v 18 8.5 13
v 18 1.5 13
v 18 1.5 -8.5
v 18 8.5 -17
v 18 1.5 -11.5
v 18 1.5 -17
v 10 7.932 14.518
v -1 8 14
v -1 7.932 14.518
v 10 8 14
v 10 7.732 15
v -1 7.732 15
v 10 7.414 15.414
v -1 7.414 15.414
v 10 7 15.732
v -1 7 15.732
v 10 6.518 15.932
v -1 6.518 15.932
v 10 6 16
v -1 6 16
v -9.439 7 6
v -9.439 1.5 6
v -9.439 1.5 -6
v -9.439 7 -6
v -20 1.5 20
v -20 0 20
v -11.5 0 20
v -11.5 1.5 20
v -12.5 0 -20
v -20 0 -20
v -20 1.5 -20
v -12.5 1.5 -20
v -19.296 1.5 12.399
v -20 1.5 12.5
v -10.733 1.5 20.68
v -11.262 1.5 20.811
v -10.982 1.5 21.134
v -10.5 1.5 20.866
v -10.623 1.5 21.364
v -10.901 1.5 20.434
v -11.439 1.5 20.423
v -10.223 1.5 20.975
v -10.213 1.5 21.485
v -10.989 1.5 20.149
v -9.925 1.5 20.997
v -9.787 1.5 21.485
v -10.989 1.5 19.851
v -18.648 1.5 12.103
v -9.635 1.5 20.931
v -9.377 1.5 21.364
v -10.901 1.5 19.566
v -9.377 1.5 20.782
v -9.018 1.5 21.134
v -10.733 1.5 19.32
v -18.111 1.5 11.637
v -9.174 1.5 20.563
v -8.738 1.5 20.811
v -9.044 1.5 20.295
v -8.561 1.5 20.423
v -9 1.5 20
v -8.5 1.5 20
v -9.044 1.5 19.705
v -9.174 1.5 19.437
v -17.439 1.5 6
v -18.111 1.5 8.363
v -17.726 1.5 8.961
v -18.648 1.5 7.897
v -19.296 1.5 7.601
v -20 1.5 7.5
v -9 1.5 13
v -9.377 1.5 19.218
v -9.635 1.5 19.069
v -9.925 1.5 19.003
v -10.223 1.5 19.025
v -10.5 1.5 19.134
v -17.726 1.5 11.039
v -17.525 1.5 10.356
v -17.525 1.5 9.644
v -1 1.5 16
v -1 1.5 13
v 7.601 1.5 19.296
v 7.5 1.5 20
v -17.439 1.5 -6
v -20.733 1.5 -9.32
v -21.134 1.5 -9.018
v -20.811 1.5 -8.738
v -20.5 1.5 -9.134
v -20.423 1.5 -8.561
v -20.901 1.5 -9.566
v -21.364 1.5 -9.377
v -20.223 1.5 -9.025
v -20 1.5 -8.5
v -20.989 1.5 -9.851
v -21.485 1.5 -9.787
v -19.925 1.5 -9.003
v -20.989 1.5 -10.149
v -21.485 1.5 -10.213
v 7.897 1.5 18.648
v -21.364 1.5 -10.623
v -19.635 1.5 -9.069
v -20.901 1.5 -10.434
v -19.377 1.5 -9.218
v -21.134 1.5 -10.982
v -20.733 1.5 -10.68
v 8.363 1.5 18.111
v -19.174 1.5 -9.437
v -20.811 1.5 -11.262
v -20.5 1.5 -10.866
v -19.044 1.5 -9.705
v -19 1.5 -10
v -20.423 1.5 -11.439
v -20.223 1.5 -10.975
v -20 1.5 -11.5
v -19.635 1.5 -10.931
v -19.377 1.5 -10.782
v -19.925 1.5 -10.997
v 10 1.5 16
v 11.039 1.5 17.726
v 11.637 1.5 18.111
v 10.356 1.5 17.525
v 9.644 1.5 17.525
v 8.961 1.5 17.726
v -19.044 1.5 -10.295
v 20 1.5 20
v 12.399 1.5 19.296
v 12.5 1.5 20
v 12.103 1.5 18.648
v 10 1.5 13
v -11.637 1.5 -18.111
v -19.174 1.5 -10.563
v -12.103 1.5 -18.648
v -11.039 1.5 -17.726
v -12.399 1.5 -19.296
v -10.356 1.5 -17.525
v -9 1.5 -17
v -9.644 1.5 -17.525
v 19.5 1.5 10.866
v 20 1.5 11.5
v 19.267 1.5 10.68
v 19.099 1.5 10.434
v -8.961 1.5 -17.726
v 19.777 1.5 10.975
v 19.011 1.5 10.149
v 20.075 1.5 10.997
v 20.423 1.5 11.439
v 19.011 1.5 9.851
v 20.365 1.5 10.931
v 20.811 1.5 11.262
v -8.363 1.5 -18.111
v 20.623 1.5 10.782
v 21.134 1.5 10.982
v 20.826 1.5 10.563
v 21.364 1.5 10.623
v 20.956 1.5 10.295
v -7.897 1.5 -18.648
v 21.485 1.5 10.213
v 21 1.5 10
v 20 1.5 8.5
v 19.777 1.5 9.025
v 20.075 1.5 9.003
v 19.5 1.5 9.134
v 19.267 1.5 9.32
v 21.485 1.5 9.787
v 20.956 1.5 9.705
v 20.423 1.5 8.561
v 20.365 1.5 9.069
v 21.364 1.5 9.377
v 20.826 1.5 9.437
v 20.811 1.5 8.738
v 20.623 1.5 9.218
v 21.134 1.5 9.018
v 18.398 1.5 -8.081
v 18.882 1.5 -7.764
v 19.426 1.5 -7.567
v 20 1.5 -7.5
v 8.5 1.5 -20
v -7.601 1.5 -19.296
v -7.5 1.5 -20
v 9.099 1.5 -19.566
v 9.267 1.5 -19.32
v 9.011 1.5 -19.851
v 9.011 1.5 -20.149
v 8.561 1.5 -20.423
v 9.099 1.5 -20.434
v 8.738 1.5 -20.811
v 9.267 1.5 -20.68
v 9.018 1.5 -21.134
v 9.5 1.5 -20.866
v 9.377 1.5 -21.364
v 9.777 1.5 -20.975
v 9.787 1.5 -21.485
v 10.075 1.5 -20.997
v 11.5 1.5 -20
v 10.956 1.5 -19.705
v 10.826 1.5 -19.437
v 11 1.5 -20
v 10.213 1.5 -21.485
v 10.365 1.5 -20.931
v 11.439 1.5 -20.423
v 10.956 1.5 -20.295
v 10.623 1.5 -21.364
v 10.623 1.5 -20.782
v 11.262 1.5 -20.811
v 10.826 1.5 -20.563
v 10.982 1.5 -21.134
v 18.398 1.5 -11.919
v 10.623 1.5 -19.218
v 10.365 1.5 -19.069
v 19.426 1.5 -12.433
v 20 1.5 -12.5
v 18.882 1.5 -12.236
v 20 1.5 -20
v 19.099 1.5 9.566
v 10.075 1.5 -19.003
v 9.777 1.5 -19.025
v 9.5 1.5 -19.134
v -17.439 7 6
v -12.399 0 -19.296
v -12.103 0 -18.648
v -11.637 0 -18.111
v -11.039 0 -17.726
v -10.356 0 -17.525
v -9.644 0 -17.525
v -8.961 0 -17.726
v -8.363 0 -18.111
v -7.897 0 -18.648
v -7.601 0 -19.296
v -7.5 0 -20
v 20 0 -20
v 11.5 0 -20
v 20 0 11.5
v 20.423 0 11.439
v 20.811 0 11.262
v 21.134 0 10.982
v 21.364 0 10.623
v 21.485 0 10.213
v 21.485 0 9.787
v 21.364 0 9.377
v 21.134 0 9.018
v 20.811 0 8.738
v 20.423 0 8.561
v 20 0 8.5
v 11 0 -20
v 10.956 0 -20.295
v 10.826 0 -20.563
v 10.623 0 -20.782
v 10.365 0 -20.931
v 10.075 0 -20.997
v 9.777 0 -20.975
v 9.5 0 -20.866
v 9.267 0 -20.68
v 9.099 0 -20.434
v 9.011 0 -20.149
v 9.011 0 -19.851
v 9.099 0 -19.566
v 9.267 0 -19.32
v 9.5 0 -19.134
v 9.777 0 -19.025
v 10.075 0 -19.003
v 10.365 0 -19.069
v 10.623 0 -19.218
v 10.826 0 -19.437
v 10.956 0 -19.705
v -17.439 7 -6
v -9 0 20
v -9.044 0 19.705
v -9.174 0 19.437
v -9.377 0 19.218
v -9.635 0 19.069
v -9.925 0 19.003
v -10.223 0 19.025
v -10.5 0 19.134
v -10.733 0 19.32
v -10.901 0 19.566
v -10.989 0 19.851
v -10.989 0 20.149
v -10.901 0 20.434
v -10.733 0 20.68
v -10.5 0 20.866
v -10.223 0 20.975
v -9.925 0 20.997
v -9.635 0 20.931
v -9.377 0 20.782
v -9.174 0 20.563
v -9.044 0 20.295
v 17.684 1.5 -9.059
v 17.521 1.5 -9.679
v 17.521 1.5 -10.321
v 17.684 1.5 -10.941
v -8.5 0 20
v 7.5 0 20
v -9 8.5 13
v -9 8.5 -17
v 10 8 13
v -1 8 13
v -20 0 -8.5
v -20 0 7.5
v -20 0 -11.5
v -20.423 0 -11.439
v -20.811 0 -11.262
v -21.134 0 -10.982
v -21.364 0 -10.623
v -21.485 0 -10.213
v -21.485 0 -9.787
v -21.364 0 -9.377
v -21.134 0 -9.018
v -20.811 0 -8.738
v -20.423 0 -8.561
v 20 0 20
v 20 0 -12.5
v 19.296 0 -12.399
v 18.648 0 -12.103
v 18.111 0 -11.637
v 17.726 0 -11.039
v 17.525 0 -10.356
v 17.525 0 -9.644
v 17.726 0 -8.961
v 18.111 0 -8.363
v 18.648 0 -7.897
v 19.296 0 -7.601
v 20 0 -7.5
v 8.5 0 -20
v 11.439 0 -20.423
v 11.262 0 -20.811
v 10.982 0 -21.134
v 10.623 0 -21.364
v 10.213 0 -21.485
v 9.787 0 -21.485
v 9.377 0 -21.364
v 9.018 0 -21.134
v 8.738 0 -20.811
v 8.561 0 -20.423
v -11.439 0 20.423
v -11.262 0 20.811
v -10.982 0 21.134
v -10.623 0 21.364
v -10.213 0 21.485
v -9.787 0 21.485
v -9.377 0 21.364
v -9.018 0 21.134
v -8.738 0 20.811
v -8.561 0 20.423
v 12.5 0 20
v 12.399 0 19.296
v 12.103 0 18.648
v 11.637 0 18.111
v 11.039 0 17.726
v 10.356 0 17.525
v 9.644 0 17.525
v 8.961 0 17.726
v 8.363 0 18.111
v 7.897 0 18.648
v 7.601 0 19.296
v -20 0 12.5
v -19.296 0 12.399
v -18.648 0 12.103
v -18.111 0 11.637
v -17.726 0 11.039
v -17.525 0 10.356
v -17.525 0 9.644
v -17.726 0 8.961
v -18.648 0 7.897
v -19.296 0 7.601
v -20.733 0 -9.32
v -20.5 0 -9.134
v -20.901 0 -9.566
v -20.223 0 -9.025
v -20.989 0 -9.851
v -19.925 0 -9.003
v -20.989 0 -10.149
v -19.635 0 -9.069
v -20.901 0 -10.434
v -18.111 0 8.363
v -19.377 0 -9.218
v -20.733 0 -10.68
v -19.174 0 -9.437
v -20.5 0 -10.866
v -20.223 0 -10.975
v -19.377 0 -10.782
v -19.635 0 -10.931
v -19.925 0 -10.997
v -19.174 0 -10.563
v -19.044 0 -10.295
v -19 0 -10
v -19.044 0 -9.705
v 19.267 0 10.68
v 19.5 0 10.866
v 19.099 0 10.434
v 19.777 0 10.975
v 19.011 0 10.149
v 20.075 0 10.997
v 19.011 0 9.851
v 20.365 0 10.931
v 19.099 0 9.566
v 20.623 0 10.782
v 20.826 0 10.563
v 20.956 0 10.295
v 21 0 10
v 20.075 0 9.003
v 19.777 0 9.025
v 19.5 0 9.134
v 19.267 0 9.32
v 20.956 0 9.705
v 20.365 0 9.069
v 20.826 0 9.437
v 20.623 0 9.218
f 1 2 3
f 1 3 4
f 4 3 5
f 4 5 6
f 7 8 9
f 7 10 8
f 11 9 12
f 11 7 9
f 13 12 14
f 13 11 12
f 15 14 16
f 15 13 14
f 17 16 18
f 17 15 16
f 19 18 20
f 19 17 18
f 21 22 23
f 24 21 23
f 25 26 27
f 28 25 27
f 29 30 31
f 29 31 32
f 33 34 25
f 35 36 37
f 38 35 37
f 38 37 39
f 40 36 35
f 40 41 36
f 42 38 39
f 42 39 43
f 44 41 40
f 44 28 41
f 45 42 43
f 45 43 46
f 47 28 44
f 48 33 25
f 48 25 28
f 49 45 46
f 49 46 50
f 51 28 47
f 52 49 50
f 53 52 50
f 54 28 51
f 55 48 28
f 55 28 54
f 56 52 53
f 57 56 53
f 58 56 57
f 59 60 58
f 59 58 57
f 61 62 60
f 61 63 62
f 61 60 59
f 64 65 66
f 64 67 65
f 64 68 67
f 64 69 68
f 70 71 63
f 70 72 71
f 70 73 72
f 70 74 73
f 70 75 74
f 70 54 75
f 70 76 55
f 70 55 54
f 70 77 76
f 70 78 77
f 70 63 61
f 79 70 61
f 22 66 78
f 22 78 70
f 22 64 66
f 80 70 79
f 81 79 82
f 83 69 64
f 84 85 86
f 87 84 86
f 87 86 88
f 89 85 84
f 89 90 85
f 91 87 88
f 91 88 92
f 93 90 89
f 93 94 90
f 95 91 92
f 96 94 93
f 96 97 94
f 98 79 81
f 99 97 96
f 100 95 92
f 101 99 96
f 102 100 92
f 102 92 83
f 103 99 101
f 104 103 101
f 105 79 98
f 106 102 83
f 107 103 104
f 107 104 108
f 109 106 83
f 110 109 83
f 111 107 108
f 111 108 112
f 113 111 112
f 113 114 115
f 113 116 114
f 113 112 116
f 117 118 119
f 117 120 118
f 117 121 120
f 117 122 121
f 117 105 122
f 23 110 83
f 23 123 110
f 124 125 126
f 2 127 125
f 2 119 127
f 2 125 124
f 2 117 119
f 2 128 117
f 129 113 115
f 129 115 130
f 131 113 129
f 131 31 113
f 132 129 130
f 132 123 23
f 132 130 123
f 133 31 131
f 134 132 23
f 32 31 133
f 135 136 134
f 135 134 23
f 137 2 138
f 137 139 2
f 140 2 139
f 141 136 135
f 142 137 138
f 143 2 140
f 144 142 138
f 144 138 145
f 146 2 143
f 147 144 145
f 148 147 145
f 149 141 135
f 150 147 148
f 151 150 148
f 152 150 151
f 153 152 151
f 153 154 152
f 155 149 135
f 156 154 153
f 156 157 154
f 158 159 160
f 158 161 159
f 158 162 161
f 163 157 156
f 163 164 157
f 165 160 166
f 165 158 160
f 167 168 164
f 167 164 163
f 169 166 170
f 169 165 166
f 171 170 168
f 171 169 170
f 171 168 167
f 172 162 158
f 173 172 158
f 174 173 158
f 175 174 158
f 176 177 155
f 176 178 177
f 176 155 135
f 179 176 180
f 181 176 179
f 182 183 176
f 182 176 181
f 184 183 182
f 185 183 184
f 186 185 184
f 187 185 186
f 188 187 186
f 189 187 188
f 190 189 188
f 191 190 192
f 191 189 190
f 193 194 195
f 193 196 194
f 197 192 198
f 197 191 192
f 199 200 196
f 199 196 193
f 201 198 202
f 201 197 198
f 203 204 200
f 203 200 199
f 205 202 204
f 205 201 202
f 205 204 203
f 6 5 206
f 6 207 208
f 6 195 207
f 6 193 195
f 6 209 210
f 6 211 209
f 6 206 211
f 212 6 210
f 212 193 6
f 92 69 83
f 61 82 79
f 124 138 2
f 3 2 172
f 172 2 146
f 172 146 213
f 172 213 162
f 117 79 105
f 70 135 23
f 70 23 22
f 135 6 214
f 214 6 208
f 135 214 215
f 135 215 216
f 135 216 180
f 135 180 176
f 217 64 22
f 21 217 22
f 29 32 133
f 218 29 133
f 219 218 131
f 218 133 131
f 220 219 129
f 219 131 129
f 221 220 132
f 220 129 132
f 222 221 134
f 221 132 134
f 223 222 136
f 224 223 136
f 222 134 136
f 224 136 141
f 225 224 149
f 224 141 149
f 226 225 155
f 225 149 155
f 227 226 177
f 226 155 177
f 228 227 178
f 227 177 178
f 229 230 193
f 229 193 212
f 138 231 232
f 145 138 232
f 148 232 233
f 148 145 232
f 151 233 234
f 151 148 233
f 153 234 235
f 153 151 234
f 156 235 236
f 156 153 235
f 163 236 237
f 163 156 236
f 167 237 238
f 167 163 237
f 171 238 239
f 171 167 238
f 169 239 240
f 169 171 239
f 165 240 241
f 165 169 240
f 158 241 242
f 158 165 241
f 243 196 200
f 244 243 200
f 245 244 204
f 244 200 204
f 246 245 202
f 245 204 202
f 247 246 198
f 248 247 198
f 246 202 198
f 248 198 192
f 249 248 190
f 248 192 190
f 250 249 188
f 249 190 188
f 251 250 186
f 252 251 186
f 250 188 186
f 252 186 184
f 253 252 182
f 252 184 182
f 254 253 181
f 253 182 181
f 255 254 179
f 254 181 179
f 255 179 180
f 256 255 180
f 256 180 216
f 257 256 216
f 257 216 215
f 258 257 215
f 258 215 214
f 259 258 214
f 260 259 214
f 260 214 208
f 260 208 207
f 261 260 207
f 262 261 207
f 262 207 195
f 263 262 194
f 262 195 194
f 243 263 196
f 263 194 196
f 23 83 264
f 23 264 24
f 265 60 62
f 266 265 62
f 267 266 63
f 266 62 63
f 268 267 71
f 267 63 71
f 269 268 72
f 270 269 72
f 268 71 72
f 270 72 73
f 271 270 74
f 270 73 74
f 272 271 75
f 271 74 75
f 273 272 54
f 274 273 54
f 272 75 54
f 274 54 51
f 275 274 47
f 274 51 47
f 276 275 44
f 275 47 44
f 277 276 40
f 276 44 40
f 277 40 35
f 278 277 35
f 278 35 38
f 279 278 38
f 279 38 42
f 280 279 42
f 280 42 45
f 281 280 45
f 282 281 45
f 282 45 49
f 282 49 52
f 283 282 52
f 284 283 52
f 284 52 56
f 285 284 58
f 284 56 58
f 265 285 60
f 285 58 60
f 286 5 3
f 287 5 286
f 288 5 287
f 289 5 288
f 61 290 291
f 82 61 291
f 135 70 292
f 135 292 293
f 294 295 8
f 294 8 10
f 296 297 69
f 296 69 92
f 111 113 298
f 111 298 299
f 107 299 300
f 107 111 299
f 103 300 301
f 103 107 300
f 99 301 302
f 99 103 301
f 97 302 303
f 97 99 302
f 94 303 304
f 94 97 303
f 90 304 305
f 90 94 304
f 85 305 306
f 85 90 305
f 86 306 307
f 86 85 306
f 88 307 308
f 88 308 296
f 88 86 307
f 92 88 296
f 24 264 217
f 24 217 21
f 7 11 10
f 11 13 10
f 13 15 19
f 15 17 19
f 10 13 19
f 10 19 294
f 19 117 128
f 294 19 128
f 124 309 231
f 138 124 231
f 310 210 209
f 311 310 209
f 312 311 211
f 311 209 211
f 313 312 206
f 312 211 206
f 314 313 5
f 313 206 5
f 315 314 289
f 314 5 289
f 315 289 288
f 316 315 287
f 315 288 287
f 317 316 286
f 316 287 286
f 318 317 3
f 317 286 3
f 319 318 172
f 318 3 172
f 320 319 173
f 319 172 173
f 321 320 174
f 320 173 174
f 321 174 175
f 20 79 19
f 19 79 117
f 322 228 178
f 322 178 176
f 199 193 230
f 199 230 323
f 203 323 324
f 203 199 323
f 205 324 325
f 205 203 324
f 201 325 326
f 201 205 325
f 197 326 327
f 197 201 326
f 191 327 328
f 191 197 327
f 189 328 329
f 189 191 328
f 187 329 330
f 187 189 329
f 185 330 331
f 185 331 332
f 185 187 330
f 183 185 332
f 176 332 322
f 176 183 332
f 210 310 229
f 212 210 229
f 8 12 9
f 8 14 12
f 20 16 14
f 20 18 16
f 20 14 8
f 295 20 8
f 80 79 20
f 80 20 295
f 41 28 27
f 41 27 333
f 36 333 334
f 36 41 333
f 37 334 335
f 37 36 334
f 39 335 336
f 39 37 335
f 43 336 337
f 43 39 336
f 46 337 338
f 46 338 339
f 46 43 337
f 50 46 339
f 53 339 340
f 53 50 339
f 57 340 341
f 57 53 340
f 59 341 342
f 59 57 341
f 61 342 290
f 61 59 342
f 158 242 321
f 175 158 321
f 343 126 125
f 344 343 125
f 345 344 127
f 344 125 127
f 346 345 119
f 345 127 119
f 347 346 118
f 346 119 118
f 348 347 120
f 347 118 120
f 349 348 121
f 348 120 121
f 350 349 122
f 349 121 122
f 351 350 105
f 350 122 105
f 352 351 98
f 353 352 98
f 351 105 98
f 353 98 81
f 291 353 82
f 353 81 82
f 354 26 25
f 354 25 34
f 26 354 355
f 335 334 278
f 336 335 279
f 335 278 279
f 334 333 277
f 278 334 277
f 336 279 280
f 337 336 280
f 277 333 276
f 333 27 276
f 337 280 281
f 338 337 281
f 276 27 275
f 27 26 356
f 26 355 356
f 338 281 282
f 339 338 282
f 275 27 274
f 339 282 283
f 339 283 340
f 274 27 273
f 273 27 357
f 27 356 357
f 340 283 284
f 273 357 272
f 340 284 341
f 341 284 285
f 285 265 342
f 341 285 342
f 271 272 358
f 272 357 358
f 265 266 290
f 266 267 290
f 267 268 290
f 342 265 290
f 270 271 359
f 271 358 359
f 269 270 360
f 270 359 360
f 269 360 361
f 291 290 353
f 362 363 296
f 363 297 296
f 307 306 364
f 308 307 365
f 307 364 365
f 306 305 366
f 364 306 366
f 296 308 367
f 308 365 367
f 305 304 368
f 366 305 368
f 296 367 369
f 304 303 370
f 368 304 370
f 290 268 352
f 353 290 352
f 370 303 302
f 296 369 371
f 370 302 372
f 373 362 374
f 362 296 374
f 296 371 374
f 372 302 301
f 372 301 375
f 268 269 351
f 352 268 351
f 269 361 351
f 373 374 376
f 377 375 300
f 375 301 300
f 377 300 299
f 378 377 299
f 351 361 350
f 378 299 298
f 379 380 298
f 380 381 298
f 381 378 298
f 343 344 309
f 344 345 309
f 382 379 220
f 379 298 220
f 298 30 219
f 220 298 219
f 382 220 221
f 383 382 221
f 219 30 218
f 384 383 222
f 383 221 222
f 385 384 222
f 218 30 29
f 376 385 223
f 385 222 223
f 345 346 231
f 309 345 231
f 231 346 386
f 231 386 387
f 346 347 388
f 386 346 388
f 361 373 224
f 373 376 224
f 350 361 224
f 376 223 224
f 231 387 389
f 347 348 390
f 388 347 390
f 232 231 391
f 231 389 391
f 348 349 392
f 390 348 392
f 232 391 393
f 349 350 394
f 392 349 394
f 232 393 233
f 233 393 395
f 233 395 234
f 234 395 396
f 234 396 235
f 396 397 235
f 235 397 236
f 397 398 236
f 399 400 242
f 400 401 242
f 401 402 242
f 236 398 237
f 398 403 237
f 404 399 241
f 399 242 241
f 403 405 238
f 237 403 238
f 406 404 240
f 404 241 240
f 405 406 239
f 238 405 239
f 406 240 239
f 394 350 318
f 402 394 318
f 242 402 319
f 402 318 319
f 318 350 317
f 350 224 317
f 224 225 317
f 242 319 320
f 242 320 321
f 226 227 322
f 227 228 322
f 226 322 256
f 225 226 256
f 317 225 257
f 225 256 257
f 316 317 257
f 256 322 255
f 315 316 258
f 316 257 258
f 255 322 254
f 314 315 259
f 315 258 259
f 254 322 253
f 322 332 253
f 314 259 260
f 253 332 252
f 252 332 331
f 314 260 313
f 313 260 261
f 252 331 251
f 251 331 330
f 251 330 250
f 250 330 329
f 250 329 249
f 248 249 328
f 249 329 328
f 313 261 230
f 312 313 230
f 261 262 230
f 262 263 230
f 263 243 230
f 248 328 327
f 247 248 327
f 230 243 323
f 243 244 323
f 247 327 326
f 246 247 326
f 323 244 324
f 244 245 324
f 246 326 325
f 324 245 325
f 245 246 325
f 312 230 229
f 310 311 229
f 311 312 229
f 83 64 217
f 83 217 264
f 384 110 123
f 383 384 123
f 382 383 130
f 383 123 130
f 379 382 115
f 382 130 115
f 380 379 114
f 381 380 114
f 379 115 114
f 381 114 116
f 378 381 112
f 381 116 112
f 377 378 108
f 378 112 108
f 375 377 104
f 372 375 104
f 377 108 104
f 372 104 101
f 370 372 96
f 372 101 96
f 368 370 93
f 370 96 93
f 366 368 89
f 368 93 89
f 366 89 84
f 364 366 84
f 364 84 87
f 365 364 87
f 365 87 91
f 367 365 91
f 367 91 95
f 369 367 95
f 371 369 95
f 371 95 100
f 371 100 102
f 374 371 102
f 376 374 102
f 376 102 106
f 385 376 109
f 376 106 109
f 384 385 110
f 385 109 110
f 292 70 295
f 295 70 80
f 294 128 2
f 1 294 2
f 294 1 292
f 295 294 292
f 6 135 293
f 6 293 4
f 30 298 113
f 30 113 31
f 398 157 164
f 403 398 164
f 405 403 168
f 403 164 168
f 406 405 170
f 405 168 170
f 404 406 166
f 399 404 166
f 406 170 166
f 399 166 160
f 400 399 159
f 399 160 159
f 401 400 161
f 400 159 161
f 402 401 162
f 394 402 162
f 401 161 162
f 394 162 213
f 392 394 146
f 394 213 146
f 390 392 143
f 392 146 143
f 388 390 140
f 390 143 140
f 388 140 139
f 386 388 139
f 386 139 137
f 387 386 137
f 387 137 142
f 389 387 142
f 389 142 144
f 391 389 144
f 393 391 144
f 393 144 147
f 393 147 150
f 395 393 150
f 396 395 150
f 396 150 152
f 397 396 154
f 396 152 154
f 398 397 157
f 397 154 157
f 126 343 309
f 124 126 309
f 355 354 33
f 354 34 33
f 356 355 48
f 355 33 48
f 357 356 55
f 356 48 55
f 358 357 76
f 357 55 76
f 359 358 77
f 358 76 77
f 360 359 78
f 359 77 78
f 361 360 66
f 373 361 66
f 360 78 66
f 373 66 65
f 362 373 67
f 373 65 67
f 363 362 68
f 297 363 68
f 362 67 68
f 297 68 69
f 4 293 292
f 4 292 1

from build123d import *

# Parameters (mm, degrees)
SKETCH1_W           = 40
SKETCH1_H           = 40
BOSS_EXTRUDE1_DEPTH = 1.5
SKETCH2_R           = 1.5
BOSS_EXTRUDE2_DEPTH = 1.5
SKETCH3_R           = 1
SKETCH3_R_2         = 2.5
CUT_EXTRUDE1_DEPTH  = 1.5
SKETCH4_W           = 8
SKETCH4_H           = 12
BOSS_EXTRUDE3_DEPTH = 5.5
SKETCH5_W           = 27
SKETCH5_H           = 30
BOSS_EXTRUDE4_DEPTH = 7
SKETCH6_W           = 11
SKETCH6_H           = 3
BOSS_EXTRUDE5_DEPTH = 6.5
FILLET1_R           = 2


with BuildPart() as part:
    # Sketch1 → Boss-Extrude1 (new body)
    with BuildSketch(Plane(origin=(0, 0, 0), x_dir=(1, 0, 0), z_dir=(0, 1, 0))):
        Rectangle(SKETCH1_W, SKETCH1_H)
    extrude(amount=BOSS_EXTRUDE1_DEPTH)

    # Sketch2 → Boss-Extrude2 (add)
    with BuildSketch(Plane(origin=(0, 1.5, 0), x_dir=(1, 0, 0), z_dir=(0, 1, 0))):
        with Locations((-20, 10)):
            Circle(SKETCH2_R)
        with Locations((10, 20)):
            Circle(SKETCH2_R)
        with Locations((20, -10)):
            Circle(SKETCH2_R)
        with Locations((-10, -20)):
            Circle(SKETCH2_R)
    extrude(amount=-BOSS_EXTRUDE2_DEPTH)

    # Sketch3 → Cut-Extrude1 (cut)
    with BuildSketch(Plane(origin=(0, 1.5, 0), x_dir=(1, 0, 0), z_dir=(0, 1, 0))):
        with Locations((-20, 10)):
            Circle(SKETCH3_R)
        with Locations((10, 20)):
            Circle(SKETCH3_R)
        with Locations((20, -10)):
            Circle(SKETCH3_R)
        with Locations((-10, -20)):
            Circle(SKETCH3_R)
        with Locations((-10, 20)):
            Circle(SKETCH3_R_2)
        with Locations((20, 10)):
            Circle(SKETCH3_R_2)
        with Locations((10, -20)):
            Circle(SKETCH3_R_2)
        with Locations((-20, -10)):
            Circle(SKETCH3_R_2)
    extrude(amount=-CUT_EXTRUDE1_DEPTH, mode=Mode.SUBTRACT)

    # Sketch4 → Boss-Extrude3 (add)
    with BuildSketch(Plane(origin=(0, 1.5, 0), x_dir=(1, 0, 0), z_dir=(0, 1, 0))):
        with Locations((-13.43888983, 0)):
            Rectangle(SKETCH4_W, SKETCH4_H)
    extrude(amount=BOSS_EXTRUDE3_DEPTH)

    # Sketch5 → Boss-Extrude4 (add)
    with BuildSketch(Plane(origin=(0, 1.5, 0), x_dir=(1, 0, 0), z_dir=(0, 1, 0))):
        with Locations((4.5, 2)):
            Rectangle(SKETCH5_W, SKETCH5_H)
    extrude(amount=BOSS_EXTRUDE4_DEPTH)

    # Sketch6 → Boss-Extrude5 (add)
    with BuildSketch(Plane(origin=(0, 1.5, 0), x_dir=(1, 0, 0), z_dir=(0, 1, 0))):
        with Locations((4.5, -14.5)):
            Rectangle(SKETCH6_W, SKETCH6_H)
    extrude(amount=BOSS_EXTRUDE5_DEPTH)

    # Fillet1
    fillet1_edges = [part.edges().sort_by_distance(p)[0] for p in [
        (4.5, 8, 16),
    ]]
    fillet(fillet1_edges, radius=FILLET1_R)


solid = part.part
